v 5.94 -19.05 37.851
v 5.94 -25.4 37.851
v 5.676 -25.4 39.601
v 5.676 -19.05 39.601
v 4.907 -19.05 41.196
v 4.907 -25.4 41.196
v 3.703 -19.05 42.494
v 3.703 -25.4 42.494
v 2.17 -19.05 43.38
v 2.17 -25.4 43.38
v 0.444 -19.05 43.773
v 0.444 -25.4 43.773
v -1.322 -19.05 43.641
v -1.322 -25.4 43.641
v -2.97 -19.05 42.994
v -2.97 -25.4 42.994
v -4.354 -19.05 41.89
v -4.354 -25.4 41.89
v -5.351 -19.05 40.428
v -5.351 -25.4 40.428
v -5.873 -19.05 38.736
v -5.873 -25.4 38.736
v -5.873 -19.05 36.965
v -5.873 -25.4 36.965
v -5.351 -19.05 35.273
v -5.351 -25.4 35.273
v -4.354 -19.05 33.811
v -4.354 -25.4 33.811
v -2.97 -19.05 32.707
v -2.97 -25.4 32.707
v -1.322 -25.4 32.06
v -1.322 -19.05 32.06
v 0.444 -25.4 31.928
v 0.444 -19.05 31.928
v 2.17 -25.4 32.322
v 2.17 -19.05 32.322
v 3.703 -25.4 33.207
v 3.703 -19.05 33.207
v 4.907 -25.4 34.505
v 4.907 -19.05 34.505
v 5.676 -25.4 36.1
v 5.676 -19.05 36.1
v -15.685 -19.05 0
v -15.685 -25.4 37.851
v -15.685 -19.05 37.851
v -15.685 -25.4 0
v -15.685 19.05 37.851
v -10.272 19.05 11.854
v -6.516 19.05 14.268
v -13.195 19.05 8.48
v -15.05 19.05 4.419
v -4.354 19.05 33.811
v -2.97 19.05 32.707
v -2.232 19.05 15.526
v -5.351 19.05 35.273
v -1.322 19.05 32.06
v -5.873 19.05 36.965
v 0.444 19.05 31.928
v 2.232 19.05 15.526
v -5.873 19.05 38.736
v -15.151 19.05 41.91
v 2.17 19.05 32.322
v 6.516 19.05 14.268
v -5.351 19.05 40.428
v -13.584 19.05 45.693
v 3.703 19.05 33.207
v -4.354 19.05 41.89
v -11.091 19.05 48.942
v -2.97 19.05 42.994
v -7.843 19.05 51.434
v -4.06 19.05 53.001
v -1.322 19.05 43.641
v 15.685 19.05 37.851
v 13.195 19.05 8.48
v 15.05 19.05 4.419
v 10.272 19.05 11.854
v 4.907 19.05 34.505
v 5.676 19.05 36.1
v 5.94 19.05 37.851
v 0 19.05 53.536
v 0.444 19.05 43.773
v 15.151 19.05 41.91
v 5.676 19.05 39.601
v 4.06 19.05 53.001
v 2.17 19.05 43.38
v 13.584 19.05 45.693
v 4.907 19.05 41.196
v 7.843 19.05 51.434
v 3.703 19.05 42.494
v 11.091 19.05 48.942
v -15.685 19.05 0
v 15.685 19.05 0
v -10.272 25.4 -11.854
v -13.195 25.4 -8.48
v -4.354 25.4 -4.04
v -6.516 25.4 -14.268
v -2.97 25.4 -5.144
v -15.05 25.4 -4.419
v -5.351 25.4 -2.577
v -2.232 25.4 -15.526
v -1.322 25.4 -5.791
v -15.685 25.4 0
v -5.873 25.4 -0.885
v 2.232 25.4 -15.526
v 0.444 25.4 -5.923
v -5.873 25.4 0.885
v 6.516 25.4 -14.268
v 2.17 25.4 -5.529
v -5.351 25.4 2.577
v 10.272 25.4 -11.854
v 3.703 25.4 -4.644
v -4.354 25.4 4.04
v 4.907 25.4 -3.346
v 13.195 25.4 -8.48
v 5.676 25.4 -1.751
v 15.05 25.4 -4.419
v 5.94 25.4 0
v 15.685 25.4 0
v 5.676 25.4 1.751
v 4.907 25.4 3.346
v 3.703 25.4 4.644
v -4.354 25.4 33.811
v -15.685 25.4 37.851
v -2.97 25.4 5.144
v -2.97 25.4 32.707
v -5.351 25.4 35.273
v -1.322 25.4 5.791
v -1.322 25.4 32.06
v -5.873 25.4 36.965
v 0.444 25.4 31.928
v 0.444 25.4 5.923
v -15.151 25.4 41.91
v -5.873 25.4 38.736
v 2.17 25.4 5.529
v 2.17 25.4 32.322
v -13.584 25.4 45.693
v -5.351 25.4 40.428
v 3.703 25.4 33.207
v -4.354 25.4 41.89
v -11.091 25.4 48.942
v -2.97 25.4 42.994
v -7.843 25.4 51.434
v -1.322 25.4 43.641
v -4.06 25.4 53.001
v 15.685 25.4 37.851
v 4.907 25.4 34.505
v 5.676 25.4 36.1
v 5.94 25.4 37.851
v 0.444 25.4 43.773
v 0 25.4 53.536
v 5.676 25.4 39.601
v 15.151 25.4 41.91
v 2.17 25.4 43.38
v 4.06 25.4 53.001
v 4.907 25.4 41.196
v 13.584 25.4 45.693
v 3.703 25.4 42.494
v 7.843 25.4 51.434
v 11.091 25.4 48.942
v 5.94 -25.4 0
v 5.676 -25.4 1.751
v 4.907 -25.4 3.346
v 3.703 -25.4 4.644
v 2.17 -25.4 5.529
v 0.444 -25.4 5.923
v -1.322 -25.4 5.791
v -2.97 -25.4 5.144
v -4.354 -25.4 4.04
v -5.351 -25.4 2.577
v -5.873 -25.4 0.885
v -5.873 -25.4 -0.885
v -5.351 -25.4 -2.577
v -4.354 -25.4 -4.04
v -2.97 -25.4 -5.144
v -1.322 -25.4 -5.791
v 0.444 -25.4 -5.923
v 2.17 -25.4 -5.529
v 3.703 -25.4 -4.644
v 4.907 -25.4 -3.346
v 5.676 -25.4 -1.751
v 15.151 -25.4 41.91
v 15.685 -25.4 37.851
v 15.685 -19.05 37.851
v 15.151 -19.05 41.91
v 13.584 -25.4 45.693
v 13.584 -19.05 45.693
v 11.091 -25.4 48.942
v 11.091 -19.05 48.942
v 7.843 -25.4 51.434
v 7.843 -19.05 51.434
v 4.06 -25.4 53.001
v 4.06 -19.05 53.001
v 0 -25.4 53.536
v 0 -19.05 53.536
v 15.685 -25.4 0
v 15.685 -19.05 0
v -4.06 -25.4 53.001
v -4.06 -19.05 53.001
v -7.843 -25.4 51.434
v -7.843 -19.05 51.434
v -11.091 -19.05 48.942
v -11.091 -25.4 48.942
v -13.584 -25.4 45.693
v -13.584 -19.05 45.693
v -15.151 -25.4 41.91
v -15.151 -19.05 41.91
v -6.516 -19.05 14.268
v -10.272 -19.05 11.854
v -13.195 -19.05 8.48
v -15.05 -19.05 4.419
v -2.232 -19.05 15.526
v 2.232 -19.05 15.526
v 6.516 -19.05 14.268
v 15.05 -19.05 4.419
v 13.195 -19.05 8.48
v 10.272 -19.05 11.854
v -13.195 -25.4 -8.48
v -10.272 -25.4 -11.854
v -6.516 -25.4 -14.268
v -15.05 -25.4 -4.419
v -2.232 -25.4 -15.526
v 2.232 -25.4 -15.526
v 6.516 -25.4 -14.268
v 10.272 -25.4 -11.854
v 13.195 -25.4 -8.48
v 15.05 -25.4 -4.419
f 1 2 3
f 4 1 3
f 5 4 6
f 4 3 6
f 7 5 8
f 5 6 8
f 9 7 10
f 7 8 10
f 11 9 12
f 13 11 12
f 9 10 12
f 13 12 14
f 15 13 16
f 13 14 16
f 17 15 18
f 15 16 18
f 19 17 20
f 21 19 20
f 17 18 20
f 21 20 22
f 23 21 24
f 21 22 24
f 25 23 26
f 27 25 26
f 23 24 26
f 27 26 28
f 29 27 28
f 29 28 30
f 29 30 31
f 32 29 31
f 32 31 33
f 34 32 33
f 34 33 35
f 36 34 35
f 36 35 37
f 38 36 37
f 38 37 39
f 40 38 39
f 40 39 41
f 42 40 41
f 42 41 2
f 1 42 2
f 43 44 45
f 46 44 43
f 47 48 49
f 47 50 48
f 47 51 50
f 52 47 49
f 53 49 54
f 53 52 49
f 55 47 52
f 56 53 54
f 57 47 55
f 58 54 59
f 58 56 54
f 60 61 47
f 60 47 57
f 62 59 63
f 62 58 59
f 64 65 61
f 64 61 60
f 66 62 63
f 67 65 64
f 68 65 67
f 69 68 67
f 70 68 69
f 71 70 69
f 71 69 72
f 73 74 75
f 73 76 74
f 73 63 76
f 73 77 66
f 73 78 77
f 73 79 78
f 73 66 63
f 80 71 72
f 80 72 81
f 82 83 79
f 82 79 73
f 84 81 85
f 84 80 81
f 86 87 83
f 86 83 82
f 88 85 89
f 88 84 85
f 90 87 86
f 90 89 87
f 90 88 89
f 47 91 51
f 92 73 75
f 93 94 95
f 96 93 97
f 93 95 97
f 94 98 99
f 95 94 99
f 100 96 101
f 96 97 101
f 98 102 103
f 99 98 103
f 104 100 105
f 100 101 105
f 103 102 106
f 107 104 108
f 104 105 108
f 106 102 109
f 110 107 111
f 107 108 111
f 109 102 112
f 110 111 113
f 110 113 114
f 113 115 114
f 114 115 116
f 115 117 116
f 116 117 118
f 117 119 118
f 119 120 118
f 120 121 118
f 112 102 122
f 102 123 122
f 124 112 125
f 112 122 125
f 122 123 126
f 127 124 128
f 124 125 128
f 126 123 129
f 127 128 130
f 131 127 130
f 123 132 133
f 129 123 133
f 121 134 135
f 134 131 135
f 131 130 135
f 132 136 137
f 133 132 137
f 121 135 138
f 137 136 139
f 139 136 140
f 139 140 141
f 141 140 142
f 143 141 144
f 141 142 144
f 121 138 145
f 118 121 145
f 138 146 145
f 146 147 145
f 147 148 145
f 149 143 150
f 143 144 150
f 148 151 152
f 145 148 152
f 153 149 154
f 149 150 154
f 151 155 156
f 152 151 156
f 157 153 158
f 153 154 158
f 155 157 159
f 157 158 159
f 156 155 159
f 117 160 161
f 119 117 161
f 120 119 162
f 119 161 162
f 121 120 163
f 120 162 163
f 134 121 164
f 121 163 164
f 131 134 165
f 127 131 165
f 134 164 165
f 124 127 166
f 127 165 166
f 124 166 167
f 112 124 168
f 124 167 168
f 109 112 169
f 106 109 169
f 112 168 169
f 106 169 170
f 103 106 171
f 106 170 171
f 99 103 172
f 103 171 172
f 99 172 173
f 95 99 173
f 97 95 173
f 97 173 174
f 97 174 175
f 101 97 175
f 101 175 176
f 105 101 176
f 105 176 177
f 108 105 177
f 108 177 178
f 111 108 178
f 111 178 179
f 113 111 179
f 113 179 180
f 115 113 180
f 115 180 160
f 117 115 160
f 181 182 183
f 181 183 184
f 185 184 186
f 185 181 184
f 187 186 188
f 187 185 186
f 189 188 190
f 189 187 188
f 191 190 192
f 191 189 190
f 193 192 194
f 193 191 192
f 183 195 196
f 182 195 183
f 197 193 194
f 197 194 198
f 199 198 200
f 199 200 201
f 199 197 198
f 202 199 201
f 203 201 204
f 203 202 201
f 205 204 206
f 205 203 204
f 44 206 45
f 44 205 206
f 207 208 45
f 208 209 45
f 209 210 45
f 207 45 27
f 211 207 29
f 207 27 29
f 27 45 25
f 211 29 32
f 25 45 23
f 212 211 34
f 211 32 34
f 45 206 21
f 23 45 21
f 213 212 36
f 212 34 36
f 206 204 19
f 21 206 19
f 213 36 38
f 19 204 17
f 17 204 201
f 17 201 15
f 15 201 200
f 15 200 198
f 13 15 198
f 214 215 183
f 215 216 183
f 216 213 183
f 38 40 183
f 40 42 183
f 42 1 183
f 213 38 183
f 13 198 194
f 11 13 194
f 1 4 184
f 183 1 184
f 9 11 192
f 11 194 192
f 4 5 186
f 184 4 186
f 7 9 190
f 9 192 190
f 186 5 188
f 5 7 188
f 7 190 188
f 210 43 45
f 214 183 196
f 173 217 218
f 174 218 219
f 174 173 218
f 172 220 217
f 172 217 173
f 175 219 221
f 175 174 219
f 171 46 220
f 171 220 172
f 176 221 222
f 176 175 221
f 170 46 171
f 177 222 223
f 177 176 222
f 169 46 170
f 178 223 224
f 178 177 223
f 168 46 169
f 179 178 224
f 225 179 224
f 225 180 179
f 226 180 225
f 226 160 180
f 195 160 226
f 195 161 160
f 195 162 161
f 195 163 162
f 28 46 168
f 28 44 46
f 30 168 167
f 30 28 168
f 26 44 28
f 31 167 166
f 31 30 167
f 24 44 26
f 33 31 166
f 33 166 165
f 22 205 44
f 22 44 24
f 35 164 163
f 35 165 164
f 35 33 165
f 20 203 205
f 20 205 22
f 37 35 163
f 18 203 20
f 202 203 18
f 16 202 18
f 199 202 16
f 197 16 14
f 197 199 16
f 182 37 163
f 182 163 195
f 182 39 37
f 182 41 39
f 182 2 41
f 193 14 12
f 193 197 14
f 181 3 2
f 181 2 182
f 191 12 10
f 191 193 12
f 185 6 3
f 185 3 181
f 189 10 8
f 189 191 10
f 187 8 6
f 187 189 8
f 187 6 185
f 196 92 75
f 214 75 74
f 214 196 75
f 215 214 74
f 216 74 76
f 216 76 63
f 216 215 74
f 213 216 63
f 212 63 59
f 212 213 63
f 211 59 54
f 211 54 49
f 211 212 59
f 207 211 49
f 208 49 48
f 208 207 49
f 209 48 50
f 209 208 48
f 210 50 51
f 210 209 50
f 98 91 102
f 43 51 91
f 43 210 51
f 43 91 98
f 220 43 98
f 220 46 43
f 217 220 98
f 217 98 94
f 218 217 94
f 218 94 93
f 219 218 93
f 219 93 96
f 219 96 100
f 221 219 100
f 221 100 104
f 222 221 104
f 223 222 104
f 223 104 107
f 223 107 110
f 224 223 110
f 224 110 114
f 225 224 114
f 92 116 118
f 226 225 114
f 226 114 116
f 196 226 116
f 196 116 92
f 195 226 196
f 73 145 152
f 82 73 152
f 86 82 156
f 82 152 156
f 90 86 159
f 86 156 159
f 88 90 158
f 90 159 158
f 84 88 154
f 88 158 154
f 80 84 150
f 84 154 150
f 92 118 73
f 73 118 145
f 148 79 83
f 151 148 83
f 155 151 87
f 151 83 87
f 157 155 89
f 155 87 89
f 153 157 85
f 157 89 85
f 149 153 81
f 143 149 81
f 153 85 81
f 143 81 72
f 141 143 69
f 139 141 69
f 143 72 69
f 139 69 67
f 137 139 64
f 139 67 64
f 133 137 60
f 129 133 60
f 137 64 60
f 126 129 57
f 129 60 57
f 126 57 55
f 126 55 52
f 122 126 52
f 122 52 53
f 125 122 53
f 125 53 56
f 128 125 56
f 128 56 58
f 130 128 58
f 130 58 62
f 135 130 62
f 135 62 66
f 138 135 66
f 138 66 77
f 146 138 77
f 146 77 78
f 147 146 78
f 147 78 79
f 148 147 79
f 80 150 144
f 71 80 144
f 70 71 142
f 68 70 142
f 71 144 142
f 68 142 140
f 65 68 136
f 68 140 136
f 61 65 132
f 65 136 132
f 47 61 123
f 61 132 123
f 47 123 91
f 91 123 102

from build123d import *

# Parameters (mm, degrees)
F0_R          = 15.685168
F1_DEPTH      = 25.4
F1_DEPTH_BACK = 25.4
F3_DEPTH      = 6.35
F5_R          = 5.939538
F6_DEPTH      = 50.801


with BuildPart() as f1:
    # F0 (on Front) → F1 (new body, two sides)
    with BuildSketch(Plane.XZ) as f1_sk:
        Circle(F0_R)
    extrude(amount=F1_DEPTH)
    extrude(f1_sk.sketch, amount=-F1_DEPTH_BACK)

    # F2 (on face) → F3 (join)
    with BuildSketch(Plane.XZ.offset(25.4)):
        with BuildLine():
            Line((-15.685168, 37.850551), (-15.685168, 0))
            ThreePointArc((-15.685168, 0), (0, -15.685168), (15.685168, 0))
            Line((15.685168, 0), (15.685168, 37.850551))
            ThreePointArc((15.685168, 37.850551), (11.091089, 48.94164), (0, 53.53572))
            ThreePointArc((0, 53.53572), (-11.091089, 48.94164), (-15.685168, 37.850551))
        make_face()
    extrude(amount=-F3_DEPTH)

    # F4: F1 across plane


with BuildPart() as f1_1:
    add(f1.part)
    add(f1.part.mirror(Plane.XZ))

    # F5 (on face) → F6 (cut, through all)
    with BuildSketch(Plane.XZ.offset(25.4)):
        with Locations((0, 37.850551)):
            Circle(F5_R)
        Circle(F5_R)
    extrude(amount=-F6_DEPTH, mode=Mode.SUBTRACT)


solid = f1_1.part
